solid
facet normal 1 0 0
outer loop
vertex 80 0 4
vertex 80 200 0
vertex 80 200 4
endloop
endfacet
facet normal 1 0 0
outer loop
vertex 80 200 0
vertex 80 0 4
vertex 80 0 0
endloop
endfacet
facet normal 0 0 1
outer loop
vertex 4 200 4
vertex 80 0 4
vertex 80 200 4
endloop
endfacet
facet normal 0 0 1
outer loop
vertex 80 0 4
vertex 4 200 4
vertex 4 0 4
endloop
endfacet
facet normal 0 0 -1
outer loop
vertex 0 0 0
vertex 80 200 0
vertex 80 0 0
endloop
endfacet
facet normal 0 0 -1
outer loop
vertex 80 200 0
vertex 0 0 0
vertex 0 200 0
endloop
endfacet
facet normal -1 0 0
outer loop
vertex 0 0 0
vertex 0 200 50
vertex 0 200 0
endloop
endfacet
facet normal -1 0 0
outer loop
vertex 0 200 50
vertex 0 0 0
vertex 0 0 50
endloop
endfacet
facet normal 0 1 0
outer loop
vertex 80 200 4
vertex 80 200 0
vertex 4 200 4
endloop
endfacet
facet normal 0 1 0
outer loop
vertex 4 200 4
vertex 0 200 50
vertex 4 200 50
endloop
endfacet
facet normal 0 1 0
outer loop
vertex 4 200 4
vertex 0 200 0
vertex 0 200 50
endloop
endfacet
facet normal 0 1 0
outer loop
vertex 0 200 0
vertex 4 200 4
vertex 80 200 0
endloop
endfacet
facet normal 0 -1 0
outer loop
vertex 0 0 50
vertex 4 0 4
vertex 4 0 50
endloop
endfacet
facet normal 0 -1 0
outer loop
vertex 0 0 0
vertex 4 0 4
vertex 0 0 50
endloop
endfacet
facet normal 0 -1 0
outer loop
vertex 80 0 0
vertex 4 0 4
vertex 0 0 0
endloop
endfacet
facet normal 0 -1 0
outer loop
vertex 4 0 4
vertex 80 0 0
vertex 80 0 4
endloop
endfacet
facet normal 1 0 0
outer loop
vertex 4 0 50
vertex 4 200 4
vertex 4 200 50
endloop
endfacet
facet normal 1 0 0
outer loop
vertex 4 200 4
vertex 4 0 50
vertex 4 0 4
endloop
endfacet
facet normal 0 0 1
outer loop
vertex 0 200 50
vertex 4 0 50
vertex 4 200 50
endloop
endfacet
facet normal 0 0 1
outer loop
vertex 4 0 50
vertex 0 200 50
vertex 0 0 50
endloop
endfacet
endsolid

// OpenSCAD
// LLM Prompt: Write code for OpenSCAD, create 3D model that is right angle L shape, wall thickness 4mm, L1 edge 80mm, L2 edge 50mm; width 200 mm
// Parameters
wall_thickness = 4; // Thickness of the walls in mm
L1 = 80;             // Length of one edge of the "L" shape in mm
L2 = 50;             // Length of the other edge of the "L" shape in mm
width = 200;         // Width of the shape in mm

module L_shape() {
    union() {
        cube([L1, width, wall_thickness]);
        cube([wall_thickness, width, L2]);
    }
}

L_shape();
